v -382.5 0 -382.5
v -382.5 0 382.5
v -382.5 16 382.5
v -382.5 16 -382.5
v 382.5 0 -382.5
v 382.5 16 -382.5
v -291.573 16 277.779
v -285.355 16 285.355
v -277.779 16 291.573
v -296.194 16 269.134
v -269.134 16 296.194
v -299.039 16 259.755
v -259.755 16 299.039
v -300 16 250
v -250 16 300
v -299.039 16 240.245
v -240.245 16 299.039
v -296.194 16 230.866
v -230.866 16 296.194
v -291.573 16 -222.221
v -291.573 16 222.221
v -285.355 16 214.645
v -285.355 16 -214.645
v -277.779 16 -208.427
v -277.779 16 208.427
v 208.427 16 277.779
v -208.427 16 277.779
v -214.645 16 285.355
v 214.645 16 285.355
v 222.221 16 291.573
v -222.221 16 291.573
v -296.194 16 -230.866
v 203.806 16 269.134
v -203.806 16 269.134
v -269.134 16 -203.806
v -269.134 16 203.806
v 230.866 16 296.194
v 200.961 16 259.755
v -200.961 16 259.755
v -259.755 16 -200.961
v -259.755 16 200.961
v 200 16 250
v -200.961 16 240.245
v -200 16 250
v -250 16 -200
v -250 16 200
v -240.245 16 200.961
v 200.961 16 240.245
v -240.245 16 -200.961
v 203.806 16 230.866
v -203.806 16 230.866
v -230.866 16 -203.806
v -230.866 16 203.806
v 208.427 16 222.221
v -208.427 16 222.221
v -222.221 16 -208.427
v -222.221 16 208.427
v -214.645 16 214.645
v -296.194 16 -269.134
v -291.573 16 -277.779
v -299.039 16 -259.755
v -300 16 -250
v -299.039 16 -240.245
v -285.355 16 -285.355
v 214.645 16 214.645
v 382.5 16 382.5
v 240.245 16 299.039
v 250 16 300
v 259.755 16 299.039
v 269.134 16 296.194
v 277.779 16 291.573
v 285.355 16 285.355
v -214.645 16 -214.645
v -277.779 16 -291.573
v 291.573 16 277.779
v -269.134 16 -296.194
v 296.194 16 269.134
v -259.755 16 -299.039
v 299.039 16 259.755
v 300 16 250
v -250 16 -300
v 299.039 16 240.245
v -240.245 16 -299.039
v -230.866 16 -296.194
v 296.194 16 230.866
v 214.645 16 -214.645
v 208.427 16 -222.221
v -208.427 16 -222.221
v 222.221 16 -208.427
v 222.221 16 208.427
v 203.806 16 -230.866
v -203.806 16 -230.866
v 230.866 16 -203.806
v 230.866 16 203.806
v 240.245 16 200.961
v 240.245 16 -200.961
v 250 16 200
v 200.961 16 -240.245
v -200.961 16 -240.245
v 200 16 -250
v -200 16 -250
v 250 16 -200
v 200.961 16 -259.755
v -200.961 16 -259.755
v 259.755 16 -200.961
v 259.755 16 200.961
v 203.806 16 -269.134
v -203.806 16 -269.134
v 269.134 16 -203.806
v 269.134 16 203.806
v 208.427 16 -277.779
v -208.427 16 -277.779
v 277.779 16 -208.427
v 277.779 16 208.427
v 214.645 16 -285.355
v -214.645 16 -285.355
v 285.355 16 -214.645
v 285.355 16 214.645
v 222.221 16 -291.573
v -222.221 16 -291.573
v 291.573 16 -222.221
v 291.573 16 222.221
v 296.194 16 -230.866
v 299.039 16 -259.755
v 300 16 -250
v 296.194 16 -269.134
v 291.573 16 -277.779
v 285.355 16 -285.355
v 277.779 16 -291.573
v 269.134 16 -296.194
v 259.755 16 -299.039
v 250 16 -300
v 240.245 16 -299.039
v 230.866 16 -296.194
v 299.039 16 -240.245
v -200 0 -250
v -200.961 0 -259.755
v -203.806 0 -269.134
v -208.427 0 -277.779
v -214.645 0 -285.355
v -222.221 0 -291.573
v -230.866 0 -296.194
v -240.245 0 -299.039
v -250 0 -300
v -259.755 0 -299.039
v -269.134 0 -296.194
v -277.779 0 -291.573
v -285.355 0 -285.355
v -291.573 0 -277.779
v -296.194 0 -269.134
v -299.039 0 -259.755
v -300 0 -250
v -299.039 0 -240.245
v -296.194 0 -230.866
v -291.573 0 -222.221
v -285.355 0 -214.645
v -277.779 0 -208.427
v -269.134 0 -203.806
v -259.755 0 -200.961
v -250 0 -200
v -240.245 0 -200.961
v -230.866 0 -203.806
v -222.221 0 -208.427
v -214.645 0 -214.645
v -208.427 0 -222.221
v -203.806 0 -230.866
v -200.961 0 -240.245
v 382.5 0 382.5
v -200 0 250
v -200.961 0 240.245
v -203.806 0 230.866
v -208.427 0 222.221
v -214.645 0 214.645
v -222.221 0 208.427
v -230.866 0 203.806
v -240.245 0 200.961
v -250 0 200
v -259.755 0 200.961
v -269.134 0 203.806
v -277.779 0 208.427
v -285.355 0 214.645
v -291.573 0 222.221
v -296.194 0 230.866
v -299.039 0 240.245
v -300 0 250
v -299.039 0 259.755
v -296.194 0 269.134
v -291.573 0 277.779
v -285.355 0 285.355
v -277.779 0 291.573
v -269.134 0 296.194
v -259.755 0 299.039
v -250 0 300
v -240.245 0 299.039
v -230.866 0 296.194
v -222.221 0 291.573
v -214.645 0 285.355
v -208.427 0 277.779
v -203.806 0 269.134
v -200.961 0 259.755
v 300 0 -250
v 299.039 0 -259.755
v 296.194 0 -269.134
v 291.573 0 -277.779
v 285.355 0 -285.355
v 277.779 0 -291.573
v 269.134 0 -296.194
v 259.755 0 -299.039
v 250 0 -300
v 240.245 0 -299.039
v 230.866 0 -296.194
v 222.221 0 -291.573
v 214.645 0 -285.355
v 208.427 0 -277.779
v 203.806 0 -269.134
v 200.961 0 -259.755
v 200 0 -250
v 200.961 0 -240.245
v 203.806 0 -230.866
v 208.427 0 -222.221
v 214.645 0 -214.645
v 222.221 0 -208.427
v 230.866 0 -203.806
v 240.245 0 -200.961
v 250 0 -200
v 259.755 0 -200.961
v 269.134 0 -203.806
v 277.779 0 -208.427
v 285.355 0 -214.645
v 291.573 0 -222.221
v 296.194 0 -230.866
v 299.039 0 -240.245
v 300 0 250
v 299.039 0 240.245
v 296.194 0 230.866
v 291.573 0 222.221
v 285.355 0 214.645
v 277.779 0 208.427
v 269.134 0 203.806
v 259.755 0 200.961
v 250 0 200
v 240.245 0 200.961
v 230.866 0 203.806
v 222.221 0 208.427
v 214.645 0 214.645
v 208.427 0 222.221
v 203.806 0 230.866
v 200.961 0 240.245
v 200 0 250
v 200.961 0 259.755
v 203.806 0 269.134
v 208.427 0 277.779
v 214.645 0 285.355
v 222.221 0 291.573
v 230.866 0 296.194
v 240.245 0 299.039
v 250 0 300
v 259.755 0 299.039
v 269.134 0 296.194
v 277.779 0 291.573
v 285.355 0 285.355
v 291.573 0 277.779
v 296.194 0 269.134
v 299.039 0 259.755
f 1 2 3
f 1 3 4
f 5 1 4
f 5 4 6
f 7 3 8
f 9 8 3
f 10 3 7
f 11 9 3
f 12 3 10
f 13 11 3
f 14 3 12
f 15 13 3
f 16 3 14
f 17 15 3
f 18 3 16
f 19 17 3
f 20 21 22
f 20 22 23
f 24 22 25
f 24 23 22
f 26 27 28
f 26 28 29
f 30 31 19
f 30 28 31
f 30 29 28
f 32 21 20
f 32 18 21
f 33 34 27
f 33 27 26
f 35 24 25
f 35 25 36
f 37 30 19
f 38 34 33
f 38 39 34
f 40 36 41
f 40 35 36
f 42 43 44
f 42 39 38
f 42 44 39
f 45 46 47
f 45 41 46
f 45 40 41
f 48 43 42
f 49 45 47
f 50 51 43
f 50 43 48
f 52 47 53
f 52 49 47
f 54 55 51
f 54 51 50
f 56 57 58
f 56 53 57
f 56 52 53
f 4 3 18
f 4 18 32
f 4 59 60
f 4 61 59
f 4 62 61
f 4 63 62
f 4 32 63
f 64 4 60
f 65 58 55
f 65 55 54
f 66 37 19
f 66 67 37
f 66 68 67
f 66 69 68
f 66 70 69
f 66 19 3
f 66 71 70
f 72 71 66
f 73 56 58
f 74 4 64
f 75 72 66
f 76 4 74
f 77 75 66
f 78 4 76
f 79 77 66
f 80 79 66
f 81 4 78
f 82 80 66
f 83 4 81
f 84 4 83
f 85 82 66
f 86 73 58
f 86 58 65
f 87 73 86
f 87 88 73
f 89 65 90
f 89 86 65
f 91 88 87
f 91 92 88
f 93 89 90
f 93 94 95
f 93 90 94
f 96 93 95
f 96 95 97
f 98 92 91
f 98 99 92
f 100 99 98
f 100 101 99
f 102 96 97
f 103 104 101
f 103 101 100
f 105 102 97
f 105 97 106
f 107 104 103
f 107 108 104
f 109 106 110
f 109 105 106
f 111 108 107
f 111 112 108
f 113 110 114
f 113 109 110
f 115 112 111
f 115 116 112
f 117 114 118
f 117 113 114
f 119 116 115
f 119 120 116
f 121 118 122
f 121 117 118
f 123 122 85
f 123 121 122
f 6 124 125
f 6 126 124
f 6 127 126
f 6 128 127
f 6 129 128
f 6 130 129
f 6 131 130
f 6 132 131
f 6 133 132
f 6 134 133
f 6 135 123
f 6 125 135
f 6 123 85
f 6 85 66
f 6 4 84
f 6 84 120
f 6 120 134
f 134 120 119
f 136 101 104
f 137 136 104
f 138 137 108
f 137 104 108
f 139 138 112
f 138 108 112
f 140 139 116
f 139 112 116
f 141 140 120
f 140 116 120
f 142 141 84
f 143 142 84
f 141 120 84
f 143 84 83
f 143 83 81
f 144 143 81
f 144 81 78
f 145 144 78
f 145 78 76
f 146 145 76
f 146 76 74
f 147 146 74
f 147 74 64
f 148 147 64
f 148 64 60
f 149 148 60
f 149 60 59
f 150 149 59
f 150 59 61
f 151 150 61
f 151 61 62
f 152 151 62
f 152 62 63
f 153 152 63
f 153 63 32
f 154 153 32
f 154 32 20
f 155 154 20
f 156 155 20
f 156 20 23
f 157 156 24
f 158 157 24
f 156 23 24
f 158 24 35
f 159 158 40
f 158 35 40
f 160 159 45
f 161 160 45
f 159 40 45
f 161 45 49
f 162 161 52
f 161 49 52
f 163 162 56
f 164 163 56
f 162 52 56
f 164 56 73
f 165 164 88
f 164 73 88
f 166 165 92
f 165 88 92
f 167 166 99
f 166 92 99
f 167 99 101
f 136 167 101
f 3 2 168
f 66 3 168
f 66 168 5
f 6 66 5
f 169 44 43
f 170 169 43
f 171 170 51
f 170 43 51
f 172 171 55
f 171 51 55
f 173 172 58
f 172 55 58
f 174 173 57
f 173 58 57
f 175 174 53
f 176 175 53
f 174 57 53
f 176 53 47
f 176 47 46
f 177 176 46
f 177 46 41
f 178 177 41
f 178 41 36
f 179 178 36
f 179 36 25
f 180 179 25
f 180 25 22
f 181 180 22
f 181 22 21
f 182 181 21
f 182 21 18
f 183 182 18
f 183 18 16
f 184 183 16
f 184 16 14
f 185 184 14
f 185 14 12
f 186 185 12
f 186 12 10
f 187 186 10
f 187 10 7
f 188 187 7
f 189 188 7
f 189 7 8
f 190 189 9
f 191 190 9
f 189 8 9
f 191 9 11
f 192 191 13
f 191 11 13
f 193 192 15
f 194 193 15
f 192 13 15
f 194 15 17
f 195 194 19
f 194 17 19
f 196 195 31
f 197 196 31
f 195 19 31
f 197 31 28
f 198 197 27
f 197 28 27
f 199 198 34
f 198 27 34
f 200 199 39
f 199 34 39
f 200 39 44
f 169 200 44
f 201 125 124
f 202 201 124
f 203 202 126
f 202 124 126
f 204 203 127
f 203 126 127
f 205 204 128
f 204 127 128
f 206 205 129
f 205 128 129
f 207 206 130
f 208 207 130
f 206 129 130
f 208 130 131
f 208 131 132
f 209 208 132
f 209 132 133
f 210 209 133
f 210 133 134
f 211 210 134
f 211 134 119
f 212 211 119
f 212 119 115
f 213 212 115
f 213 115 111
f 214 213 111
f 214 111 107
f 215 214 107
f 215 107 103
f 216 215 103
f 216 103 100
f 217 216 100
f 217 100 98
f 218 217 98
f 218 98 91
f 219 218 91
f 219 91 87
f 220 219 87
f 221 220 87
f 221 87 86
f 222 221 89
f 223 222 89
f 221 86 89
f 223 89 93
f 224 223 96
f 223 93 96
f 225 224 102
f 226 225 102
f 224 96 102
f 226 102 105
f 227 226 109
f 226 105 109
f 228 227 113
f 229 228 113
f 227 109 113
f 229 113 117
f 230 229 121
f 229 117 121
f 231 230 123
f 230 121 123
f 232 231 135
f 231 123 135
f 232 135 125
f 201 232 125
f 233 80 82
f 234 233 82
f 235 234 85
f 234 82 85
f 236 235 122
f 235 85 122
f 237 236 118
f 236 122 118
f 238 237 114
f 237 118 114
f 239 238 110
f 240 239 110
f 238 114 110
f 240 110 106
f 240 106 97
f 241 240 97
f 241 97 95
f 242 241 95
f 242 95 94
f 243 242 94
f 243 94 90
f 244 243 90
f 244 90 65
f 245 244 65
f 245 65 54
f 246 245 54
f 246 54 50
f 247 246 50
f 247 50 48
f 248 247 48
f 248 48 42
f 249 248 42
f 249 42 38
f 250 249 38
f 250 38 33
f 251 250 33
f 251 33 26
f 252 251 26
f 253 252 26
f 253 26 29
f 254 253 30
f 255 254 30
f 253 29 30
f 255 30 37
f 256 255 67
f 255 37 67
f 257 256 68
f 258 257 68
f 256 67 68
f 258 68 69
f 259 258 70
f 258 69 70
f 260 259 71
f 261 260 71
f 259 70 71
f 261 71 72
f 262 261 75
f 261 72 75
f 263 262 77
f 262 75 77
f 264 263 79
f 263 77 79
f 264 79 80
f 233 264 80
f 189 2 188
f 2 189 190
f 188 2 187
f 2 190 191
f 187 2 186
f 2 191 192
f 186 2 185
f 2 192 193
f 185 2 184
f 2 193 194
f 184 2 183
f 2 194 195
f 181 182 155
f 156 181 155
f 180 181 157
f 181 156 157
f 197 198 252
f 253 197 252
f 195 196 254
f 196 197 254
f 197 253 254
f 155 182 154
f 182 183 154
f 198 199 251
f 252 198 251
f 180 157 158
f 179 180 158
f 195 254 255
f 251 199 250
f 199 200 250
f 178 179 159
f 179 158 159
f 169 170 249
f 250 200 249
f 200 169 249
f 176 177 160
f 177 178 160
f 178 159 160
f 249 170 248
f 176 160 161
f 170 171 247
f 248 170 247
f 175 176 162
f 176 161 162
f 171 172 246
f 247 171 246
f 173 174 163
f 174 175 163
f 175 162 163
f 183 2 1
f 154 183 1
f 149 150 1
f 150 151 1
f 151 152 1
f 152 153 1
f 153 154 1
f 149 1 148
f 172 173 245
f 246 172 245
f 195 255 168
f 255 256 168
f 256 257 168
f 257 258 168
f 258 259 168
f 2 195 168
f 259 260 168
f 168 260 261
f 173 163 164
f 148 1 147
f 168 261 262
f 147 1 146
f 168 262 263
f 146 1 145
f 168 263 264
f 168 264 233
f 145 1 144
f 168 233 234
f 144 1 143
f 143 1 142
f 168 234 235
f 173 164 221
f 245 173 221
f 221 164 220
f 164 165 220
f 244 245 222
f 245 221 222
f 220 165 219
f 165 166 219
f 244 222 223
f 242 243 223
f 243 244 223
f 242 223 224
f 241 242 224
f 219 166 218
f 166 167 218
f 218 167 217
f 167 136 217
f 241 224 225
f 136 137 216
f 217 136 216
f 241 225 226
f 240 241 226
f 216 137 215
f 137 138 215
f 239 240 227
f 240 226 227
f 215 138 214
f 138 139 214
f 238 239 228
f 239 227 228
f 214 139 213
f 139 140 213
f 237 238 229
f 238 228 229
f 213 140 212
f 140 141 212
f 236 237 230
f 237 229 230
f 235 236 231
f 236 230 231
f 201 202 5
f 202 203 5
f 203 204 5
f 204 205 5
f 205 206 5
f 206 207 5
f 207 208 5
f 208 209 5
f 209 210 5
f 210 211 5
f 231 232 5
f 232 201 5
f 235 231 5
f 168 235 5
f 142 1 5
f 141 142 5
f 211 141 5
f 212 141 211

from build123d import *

# Parameters (mm, degrees)
SKETCH1_W           = 765
SKETCH1_H           = 765
BOSS_EXTRUDE1_DEPTH = 16
CUT_EXTRUDE2_REACH  = 18
SKETCH5_R           = 50


with BuildPart() as part:
    # Sketch1 → Boss-Extrude1 (new body)
    with BuildSketch(Plane(origin=(0, 0, 0), x_dir=(1, 0, 0), z_dir=(0, 1, 0))):
        Rectangle(SKETCH1_W, SKETCH1_H)
    extrude(amount=BOSS_EXTRUDE1_DEPTH)

    # Sketch5 → Cut-Extrude2 (cut, up to next)
    with BuildSketch(Plane(origin=(0, 16, 0), x_dir=(1, 0, 0), z_dir=(0, 1, 0)), mode=Mode.PRIVATE) as cut_extrude2_sk1:
        with Locations((-250, 250)):
            Circle(SKETCH5_R)
    cut_extrude2_tool1 = extrude(cut_extrude2_sk1.sketch, amount=-CUT_EXTRUDE2_REACH, mode=Mode.PRIVATE) & part.part
    add(cut_extrude2_tool1.solids().sort_by_distance((-250, 16, -250))[0], mode=Mode.SUBTRACT)
    # Sketch5 → Cut-Extrude2 (cut, up to next)
    with BuildSketch(Plane(origin=(0, 16, 0), x_dir=(1, 0, 0), z_dir=(0, 1, 0)), mode=Mode.PRIVATE) as cut_extrude2_sk2:
        with Locations((250, 250)):
            Circle(SKETCH5_R)
    cut_extrude2_tool2 = extrude(cut_extrude2_sk2.sketch, amount=-CUT_EXTRUDE2_REACH, mode=Mode.PRIVATE) & part.part
    add(cut_extrude2_tool2.solids().sort_by_distance((250, 16, -250))[0], mode=Mode.SUBTRACT)
    # Sketch5 → Cut-Extrude2 (cut, up to next)
    with BuildSketch(Plane(origin=(0, 16, 0), x_dir=(1, 0, 0), z_dir=(0, 1, 0)), mode=Mode.PRIVATE) as cut_extrude2_sk3:
        with Locations((250, -250)):
            Circle(SKETCH5_R)
    cut_extrude2_tool3 = extrude(cut_extrude2_sk3.sketch, amount=-CUT_EXTRUDE2_REACH, mode=Mode.PRIVATE) & part.part
    add(cut_extrude2_tool3.solids().sort_by_distance((250, 16, 250))[0], mode=Mode.SUBTRACT)
    # Sketch5 → Cut-Extrude2 (cut, up to next)
    with BuildSketch(Plane(origin=(0, 16, 0), x_dir=(1, 0, 0), z_dir=(0, 1, 0)), mode=Mode.PRIVATE) as cut_extrude2_sk4:
        with Locations((-250, -250)):
            Circle(SKETCH5_R)
    cut_extrude2_tool4 = extrude(cut_extrude2_sk4.sketch, amount=-CUT_EXTRUDE2_REACH, mode=Mode.PRIVATE) & part.part
    add(cut_extrude2_tool4.solids().sort_by_distance((-250, 16, 250))[0], mode=Mode.SUBTRACT)


solid = part.part
